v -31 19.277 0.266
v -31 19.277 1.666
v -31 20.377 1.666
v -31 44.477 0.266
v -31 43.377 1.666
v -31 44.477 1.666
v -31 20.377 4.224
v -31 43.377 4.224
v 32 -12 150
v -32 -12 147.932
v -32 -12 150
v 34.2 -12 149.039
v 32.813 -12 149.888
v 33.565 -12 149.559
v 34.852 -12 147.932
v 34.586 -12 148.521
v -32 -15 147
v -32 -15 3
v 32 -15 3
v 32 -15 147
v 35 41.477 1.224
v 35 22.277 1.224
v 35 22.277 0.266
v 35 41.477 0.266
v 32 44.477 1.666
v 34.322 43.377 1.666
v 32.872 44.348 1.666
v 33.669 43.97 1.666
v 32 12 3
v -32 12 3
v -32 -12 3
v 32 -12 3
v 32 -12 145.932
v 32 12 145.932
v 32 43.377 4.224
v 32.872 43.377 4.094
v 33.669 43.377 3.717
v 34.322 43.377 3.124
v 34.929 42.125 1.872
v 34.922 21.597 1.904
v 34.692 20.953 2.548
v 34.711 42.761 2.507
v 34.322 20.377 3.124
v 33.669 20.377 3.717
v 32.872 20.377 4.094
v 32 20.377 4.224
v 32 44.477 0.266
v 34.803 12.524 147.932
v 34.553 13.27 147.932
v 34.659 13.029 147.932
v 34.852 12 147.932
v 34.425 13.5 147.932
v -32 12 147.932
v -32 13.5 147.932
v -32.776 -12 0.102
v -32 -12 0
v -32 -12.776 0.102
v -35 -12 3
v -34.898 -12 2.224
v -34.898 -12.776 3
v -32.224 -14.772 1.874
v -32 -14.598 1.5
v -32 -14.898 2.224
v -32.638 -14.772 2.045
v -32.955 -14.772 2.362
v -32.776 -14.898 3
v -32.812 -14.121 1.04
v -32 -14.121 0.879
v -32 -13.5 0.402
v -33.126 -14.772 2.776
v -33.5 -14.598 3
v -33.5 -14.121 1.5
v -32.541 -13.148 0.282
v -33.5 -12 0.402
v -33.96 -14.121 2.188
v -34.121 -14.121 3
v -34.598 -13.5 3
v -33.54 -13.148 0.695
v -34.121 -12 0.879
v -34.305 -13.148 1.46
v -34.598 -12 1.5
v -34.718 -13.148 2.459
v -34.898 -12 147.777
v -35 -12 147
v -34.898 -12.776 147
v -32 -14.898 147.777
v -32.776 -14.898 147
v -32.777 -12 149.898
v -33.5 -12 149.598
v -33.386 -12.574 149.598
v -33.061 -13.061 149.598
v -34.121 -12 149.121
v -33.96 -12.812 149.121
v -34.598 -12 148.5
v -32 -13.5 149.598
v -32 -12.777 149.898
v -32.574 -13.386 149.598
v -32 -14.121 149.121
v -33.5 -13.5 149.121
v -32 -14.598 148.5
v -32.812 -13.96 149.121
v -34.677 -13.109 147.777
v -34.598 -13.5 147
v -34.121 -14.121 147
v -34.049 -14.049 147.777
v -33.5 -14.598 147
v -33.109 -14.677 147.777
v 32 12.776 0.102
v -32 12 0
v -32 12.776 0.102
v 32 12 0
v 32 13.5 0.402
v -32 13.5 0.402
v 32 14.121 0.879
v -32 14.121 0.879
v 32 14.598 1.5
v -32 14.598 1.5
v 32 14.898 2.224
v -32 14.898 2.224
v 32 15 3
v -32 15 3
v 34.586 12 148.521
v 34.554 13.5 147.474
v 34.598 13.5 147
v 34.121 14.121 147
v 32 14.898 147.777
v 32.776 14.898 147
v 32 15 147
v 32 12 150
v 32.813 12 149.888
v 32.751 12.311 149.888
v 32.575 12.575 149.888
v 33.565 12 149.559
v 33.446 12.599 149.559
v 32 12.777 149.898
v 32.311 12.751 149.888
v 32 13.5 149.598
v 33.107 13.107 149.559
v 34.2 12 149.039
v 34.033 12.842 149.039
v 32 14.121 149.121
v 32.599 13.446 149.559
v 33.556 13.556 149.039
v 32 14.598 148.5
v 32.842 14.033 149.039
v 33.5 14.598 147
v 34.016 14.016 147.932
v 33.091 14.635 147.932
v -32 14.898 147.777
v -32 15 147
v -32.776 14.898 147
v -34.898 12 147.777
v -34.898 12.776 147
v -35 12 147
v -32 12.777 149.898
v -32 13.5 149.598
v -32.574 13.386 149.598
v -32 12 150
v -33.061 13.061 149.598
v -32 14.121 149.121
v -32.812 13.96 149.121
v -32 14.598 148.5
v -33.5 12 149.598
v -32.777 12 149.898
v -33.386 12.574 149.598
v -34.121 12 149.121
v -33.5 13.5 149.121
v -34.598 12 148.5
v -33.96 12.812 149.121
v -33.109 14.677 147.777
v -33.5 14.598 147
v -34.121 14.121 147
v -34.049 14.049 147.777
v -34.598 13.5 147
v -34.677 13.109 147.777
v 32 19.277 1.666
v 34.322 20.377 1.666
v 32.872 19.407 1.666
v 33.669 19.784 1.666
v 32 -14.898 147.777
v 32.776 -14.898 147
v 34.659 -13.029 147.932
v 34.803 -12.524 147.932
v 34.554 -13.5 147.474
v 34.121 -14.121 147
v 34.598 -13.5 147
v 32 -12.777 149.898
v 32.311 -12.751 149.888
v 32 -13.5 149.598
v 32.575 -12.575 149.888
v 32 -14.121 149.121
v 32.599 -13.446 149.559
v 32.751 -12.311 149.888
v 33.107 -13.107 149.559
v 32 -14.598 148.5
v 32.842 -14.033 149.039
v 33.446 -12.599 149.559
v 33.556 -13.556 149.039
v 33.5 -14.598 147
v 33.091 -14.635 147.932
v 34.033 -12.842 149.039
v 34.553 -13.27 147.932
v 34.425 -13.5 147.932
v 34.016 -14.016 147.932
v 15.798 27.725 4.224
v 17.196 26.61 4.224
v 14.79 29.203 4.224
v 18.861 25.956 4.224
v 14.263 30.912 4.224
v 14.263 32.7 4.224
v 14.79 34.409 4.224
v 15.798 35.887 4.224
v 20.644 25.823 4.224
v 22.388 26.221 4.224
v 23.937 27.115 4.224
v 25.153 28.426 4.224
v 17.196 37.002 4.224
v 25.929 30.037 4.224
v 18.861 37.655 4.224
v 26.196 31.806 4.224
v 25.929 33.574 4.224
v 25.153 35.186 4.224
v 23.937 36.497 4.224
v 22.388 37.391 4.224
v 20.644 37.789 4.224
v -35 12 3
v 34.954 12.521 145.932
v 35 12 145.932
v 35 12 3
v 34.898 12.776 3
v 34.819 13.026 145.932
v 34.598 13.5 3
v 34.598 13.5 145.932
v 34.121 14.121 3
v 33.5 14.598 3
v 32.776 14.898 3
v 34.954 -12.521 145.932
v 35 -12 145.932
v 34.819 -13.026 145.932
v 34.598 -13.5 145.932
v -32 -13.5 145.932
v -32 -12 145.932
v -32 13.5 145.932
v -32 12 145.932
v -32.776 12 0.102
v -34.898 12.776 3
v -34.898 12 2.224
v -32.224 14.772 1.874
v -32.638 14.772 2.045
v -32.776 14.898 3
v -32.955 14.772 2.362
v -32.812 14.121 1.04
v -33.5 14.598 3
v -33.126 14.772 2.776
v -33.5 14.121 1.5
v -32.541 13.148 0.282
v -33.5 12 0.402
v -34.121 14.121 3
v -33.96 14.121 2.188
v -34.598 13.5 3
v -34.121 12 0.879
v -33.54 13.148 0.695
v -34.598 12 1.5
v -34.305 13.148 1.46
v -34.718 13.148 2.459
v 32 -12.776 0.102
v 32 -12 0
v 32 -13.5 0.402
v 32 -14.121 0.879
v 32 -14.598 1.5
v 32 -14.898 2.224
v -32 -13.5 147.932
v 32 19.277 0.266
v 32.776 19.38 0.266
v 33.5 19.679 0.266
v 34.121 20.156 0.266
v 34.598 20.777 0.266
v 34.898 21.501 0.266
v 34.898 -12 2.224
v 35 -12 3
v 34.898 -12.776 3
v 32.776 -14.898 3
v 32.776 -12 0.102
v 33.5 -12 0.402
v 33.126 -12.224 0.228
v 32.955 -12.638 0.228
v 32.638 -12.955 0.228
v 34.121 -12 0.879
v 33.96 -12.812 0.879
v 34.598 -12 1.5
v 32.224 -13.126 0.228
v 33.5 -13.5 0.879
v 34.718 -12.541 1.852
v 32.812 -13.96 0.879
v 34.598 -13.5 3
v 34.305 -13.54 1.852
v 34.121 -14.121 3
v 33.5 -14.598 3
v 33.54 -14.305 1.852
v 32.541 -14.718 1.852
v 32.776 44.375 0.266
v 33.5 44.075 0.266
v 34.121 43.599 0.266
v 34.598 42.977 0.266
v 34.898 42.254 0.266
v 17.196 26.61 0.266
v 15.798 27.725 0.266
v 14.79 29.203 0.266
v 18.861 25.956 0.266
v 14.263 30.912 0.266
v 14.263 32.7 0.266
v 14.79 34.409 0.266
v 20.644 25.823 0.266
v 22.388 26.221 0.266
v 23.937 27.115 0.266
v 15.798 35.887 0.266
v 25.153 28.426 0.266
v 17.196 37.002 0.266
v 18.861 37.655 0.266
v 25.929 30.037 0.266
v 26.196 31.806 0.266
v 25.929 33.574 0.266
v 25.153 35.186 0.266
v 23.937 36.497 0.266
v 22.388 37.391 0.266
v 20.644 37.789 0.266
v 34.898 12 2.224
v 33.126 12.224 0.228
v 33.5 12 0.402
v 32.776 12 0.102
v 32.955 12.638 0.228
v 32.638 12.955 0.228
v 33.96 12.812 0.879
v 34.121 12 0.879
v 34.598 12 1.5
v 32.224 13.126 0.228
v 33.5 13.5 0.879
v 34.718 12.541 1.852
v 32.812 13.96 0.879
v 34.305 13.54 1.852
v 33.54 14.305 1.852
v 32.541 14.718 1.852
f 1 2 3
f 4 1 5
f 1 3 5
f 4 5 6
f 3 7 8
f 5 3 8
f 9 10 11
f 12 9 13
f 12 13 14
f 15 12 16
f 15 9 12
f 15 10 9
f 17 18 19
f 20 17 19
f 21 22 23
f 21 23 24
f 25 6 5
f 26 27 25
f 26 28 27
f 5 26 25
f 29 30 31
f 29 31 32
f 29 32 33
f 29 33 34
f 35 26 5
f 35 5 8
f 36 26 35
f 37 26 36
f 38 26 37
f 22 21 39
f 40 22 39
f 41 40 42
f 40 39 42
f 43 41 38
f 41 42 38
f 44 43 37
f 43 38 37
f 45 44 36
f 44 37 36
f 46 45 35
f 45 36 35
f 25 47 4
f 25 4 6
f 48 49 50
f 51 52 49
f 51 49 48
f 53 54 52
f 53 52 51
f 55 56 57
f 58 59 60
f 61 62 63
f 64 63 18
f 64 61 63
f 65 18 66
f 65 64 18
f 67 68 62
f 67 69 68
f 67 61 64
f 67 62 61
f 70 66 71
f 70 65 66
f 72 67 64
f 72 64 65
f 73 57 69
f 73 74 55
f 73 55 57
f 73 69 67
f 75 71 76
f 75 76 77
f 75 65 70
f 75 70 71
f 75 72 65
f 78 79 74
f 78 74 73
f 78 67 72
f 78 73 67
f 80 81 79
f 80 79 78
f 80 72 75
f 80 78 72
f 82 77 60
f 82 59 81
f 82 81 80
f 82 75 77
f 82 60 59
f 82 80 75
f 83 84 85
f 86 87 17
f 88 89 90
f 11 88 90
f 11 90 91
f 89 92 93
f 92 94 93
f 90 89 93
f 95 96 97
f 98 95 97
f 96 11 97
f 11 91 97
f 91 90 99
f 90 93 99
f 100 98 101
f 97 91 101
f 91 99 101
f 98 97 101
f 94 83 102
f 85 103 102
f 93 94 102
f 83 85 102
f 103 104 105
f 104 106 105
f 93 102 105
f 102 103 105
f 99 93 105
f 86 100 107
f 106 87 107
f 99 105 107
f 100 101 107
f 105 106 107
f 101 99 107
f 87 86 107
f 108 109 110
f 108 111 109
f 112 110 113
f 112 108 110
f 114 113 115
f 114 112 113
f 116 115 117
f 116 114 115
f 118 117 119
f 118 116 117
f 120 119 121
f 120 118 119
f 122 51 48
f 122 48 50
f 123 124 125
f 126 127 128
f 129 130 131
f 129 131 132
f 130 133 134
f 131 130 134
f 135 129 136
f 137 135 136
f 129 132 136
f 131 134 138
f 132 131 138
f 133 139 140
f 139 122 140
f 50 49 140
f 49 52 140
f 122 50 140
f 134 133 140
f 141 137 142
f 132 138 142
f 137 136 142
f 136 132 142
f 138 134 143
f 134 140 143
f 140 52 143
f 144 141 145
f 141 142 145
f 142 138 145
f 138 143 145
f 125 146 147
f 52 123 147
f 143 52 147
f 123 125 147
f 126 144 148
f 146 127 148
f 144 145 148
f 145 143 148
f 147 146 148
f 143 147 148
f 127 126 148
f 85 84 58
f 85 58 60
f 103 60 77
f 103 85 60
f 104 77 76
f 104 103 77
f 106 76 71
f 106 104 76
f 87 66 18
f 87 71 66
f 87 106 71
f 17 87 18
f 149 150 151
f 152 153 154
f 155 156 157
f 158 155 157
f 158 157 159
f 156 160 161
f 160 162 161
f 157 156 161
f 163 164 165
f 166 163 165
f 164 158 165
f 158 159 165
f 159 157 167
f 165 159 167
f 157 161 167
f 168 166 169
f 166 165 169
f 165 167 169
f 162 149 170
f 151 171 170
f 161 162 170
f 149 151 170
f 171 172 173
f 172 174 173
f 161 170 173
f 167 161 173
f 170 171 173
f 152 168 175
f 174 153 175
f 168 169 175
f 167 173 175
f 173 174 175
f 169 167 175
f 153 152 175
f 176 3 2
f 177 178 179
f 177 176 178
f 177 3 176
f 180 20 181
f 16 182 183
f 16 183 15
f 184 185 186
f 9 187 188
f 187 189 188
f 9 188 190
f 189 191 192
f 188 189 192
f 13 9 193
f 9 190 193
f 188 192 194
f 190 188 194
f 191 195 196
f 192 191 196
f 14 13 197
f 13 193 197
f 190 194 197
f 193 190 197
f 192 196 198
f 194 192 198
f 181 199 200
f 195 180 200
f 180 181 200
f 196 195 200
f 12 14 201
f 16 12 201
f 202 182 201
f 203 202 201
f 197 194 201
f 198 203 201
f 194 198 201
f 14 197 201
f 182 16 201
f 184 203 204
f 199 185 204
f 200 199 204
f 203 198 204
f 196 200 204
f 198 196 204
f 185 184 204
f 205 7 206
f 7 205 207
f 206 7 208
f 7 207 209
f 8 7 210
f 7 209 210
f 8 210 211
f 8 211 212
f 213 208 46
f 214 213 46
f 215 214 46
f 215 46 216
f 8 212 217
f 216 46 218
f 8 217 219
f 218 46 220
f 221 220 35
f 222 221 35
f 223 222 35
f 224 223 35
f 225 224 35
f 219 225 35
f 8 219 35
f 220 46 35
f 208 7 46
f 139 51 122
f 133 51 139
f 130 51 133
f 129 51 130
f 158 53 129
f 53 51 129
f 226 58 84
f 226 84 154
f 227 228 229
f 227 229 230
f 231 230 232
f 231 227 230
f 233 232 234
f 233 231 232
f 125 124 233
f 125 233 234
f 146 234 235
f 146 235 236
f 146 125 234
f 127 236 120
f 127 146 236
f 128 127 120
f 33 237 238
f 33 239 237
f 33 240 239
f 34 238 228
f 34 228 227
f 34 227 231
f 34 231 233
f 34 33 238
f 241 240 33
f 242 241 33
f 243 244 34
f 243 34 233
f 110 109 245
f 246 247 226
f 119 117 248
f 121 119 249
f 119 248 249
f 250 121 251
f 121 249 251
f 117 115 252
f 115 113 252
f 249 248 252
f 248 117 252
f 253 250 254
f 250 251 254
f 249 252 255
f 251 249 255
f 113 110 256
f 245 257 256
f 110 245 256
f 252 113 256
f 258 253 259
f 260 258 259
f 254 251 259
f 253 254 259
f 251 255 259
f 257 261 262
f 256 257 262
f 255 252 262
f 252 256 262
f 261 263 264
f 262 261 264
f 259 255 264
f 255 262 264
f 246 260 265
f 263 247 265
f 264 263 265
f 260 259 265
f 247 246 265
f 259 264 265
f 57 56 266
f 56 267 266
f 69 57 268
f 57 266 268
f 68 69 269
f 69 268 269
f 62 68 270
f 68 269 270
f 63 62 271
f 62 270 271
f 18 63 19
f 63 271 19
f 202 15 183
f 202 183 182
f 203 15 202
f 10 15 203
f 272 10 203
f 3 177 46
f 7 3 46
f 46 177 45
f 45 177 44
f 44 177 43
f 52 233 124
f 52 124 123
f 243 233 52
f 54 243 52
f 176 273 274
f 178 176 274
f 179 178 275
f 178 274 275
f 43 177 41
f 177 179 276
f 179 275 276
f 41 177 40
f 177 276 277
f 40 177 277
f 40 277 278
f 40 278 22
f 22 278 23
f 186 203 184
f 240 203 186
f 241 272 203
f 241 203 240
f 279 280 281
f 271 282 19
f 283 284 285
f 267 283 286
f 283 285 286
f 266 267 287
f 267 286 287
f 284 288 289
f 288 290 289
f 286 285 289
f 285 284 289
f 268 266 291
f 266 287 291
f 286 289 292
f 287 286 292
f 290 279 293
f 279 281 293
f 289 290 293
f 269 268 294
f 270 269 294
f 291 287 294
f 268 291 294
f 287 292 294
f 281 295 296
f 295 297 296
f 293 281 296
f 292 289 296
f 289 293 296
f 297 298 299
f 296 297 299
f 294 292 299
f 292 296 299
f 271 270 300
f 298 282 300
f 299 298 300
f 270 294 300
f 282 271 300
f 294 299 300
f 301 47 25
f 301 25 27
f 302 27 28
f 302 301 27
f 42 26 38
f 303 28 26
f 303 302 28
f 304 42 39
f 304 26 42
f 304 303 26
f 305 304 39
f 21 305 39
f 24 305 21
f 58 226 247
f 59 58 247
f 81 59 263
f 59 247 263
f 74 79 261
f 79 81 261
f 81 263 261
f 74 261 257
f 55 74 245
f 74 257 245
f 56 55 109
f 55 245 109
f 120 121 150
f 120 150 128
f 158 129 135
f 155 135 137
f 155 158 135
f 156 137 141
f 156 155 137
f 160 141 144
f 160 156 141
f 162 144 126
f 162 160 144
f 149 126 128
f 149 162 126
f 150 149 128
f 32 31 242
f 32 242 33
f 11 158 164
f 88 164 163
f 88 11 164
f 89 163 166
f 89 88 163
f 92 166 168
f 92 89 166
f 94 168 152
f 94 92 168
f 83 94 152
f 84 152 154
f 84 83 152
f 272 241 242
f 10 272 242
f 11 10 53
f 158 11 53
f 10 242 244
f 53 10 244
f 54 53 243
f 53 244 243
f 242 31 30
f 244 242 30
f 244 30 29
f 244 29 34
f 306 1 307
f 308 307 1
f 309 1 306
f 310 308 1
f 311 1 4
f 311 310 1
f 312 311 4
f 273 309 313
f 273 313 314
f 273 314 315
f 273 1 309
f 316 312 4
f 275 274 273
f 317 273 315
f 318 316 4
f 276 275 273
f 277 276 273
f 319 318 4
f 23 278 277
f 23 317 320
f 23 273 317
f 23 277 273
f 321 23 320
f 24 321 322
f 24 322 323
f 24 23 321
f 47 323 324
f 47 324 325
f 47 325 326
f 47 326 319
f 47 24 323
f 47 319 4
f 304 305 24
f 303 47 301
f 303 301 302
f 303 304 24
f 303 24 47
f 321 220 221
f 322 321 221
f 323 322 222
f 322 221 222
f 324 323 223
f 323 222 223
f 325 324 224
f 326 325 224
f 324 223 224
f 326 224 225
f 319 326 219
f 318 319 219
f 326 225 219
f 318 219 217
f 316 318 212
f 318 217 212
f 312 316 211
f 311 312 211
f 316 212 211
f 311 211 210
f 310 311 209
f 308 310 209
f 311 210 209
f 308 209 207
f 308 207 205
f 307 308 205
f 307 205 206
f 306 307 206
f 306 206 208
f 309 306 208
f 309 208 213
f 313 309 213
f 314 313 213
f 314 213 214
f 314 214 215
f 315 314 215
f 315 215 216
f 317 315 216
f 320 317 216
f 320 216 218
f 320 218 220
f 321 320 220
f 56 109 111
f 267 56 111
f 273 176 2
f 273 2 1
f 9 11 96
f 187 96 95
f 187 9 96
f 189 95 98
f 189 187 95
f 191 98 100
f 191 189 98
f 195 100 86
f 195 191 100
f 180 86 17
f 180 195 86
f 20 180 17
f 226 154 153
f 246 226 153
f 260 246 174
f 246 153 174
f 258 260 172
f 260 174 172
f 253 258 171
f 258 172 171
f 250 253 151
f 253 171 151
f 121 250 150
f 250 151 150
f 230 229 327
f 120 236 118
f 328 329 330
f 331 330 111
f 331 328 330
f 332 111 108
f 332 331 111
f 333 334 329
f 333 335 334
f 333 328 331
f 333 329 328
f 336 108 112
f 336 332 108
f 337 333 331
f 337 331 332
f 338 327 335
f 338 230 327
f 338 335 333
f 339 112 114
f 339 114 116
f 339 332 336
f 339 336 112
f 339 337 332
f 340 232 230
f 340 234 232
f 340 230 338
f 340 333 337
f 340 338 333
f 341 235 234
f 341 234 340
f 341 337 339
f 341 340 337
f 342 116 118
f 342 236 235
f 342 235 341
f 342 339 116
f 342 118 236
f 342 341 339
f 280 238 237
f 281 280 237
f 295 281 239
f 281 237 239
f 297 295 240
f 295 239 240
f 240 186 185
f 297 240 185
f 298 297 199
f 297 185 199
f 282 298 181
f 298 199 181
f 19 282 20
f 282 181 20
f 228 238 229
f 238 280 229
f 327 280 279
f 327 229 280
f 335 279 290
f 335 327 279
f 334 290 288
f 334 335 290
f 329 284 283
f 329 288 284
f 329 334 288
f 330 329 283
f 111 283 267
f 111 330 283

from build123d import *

# Parameters (mm, degrees)
F0_W          = 70
F0_H          = 30
F1_DEPTH      = 150
F2_T          = -3
F3_W          = 24
F3_H          = 2.5384937525
F3_H_2        = 0.4615062475
F4_DEPTH      = 36.4
F4_DEPTH_BACK = 32
F5_R          = 3
F6_R          = 2.9999
F7_W          = 23
F7_H          = 2.5571812009
F7_H_2        = 0.0428187991
F8_DEPTH      = 35
F8_DEPTH_BACK = 31
F9_T1_DEPTH   = 38
F9_T3_DEPTH   = 16.4
F10_R         = 6
F11_DEPTH     = 4.2246429837


# Not quite as in the source:
# - a fillet or chamfer that OpenCascade refuses, or shapes differently, is made with other operations: its cross-section is extruded or revolved along the edge and cut away or added
# - a fillet or chamfer is up to 0.001 mm smaller than in the source, because OpenCascade refuses the exact size


with BuildPart() as f1:
    # F0 (on Top) → F1 (new body)
    with BuildSketch(Plane.XY):
        Rectangle(F0_W, F0_H)
    extrude(amount=F1_DEPTH)

    # F2
    f2_openings = [f1.faces().sort_by_distance(p)[0] for p in [
        (0, 0, 150),
    ]]
    offset(amount=F2_T, openings=f2_openings)

    # F3 (on Right) → F4 (cut, two sides)
    with BuildSketch(Plane.YZ) as f4_sk:
        with Locations((0, 149.2011186481)):
            Rectangle(F3_W, F3_H)
        Polygon((13.5, 147.9318717718), (12, 147.9318717718), (12, 147.4703655243), (-12, 147.4703655243), (-12, 147.9318717718), (-13.5, 147.9318717718), (-13.5, 145.9318717718), (13.5, 145.9318717718), align=None)
        with Locations((0, 147.7011186481)):
            Rectangle(F3_W, F3_H_2)
    extrude(amount=F4_DEPTH, mode=Mode.SUBTRACT)
    extrude(f4_sk.sketch, amount=-F4_DEPTH_BACK, mode=Mode.SUBTRACT)

    # F5
    f5_edges = [f1.edges().sort_by_distance(p)[0] for p in [
        (35, 15, 75),
        (35, -15, 75),
        (35, 0, 0),
        (-35, 0, 0),
        (0, -15, 0),
        (0, 15, 0),
        (-35, 15, 75),
        (-35, -15, 75),
    ]]
    fillet(f5_edges, radius=F5_R)

    # F6 (radius 3 in the source; OpenCascade refuses exactly that, so slightly less here)
    f6_edges = [f1.edges().sort_by_distance(p)[0] for p in [
        (0, -15, 150),
    ]]
    fillet(f6_edges, radius=F6_R)


with BuildPart() as f8:
    # F7 (on Right) → F8 (new body, two sides)
    with BuildSketch(Plane.YZ) as f8_sk:
        with Locations((31.8773090839, 2.9450523832)):
            Rectangle(F7_W, F7_H)
        Polygon((44.4773090839, 1.6664617828), (43.3773090839, 1.6664617828), (43.3773090839, 1.6236429837), (20.3773090839, 1.6236429837), (20.3773090839, 1.6664617828), (19.2773090839, 1.6664617828), (19.2773090839, 0.2664617828), (44.4773090839, 0.2664617828), align=None)
        with Locations((31.8773090839, 1.6450523832)):
            Rectangle(F7_W, F7_H_2)
    extrude(amount=F8_DEPTH)
    extrude(f8_sk.sketch, amount=-F8_DEPTH_BACK)

    # F9: fillet of radius 3 on 3 edges, made by hand

    # F9_s2 → F9_t1 (cut)
    with BuildSketch(Plane.XZ.offset(-50.8773090839)):
        with BuildLine():
            ThreePointArc((35, 1.2236429837), (34.1213203436, 3.3449633272), (32, 4.2236429837))
            Line((32, 4.2236429837), (35, 4.2236429837))
            Line((35, 4.2236429837), (35, 1.2236429837))
        make_face()
    extrude(amount=F9_T1_DEPTH, mode=Mode.SUBTRACT)

    # F9_s4 → F9_t3 (cut)
    with BuildSketch(Plane.XY.offset(-7.2335382172)):
        with BuildLine():
            ThreePointArc((32, 19.2773090839), (34.1213203436, 20.1559887404), (35, 22.2773090839))
            Line((35, 22.2773090839), (35, 19.2773090839))
            Line((35, 19.2773090839), (32, 19.2773090839))
        make_face()
        with BuildLine():
            ThreePointArc((32, 44.4773090839), (34.1213203436, 43.5986294275), (35, 41.4773090839))
            Line((35, 41.4773090839), (35, 44.4773090839))
            Line((35, 44.4773090839), (32, 44.4773090839))
        make_face()
    extrude(amount=F9_T3_DEPTH, mode=Mode.SUBTRACT)

    # F10 (on face) → F11 (cut, through all)
    with BuildSketch(Plane.XY.offset(4.2236429837)):
        with Locations((20.1958809048, 31.8059250712)):
            Circle(F10_R)
    extrude(amount=-F11_DEPTH, mode=Mode.SUBTRACT)


solid = Compound([f1.part, f8.part])
